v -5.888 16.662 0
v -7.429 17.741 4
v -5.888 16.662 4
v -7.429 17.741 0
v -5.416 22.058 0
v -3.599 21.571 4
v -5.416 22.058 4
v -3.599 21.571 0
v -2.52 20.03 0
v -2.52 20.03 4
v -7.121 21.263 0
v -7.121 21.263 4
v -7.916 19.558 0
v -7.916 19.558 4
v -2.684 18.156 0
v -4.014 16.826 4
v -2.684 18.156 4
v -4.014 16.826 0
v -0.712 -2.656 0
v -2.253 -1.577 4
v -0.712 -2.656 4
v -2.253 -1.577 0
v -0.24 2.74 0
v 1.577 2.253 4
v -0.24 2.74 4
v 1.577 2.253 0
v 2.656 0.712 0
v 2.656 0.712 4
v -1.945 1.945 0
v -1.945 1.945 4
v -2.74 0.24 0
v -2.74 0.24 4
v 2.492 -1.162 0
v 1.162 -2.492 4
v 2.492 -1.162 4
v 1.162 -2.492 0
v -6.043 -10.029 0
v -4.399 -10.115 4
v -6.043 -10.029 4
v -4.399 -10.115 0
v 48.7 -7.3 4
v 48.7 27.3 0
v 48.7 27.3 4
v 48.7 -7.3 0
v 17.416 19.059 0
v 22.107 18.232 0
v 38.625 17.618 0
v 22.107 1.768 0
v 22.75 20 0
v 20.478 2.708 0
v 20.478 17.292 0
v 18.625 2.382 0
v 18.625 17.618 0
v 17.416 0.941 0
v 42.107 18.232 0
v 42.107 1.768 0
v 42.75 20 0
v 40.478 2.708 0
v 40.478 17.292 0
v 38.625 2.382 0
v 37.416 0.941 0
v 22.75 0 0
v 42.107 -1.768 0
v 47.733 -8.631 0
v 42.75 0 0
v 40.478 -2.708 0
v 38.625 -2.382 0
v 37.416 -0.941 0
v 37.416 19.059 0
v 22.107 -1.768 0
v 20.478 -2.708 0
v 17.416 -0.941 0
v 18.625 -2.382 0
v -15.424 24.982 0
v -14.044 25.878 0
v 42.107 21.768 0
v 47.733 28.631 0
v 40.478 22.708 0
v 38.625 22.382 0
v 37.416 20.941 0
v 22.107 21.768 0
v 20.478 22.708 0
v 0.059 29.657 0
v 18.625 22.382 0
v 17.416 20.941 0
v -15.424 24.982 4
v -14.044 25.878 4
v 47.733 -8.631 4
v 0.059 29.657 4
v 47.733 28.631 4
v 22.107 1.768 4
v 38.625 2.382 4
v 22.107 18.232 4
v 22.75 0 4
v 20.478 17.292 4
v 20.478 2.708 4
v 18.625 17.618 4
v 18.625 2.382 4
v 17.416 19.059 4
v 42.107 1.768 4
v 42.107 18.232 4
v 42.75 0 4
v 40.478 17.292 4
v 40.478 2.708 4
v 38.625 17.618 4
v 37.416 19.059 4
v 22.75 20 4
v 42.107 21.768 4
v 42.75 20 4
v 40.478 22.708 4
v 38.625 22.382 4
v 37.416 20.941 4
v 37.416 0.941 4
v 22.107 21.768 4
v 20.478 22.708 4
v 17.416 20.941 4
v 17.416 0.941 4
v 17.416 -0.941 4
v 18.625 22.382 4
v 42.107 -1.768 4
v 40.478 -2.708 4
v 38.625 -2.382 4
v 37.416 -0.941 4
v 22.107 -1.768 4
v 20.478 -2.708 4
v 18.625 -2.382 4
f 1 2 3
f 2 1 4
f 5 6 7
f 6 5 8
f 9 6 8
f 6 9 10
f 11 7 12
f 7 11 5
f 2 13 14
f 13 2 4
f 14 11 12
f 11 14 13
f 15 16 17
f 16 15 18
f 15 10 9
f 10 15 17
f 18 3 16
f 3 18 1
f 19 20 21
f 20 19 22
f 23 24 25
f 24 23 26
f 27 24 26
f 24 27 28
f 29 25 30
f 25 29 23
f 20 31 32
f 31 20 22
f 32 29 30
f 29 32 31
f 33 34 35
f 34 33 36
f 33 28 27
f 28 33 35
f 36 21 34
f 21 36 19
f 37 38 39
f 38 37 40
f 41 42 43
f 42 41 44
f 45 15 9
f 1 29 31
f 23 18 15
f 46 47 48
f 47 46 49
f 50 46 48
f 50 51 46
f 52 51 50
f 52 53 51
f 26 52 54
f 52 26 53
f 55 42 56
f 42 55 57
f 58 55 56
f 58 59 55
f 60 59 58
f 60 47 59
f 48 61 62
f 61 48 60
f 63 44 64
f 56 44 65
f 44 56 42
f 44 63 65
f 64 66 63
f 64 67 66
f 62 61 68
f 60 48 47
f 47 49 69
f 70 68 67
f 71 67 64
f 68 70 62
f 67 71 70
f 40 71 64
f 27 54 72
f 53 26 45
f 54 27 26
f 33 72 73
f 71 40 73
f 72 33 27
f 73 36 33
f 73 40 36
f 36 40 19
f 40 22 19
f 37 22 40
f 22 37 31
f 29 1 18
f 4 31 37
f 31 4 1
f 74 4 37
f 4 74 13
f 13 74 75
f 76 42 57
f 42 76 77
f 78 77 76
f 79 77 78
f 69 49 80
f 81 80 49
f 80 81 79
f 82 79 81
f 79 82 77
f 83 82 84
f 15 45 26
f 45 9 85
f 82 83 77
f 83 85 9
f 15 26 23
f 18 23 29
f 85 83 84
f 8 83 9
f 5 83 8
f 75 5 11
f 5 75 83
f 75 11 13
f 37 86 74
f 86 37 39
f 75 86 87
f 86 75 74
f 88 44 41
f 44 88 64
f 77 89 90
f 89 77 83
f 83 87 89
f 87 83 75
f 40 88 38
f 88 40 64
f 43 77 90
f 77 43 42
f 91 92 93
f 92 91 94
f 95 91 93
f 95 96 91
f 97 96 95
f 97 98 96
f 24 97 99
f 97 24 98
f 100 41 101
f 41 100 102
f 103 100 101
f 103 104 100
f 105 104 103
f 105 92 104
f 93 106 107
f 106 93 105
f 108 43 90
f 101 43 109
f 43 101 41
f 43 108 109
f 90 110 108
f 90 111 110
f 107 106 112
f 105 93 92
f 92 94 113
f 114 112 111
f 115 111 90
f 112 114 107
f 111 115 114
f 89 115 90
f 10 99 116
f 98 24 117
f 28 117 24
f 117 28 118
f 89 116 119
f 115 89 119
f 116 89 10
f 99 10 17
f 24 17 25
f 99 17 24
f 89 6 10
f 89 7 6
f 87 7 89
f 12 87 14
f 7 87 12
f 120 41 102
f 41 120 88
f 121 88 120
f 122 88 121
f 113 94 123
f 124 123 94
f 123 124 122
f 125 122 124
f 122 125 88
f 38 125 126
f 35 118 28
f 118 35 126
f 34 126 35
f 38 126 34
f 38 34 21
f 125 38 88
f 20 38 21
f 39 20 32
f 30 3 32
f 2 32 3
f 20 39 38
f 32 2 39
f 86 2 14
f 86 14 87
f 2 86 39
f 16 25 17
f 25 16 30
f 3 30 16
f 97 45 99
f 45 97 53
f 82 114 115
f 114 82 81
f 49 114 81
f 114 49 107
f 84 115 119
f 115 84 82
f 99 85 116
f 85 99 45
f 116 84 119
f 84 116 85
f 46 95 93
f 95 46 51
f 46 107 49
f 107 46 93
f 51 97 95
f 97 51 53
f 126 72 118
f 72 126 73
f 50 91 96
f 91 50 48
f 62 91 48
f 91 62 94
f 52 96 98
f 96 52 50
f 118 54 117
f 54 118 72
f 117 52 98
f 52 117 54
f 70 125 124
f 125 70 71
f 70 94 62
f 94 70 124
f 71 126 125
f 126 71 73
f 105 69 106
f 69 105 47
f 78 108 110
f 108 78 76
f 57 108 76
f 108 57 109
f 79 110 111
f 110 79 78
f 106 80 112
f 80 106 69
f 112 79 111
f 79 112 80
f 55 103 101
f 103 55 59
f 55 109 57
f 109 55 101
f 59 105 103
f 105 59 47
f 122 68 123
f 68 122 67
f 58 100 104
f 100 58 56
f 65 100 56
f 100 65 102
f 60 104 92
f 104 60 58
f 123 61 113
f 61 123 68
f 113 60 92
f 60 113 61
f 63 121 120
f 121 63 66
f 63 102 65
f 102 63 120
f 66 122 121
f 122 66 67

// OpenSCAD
// rob@openpart.co.uk 20140202-02:02
// 6 hole joining plate to connect 40mm to 20mm NOMINAL extrusion at 15 degrees
// V-Slot & others

module roundedRect(size, radius) {
	x = size[0];
	y = size[1];
	z = size[2];
	linear_extrude(height=z)
	hull()
	{
		// place 4 circles in the corners, with the given radius
		translate([(-x/2)+(radius/2), (-y/2)+(radius/2), 0])
		circle(r=radius);
		translate([(x/2)-(radius/2), (-y/2)+(radius/2), 0])
		circle(r=radius);
		translate([(-x/2)+(radius/2), (y/2)-(radius/2), 0])
		circle(r=radius);
		translate([(x/2)-(radius/2), (y/2)-(radius/2), 0])
		circle(r=radius);
	}
}
angle = 15;
hole = 5.5 / 2;
plate_width1 = 36;
plate_width2 = 36;
plate_length = 16;
plate_thickness = 4;
extend_past_thickness = 2;
corner_radius = 1.4;
difference() {
	hull () {
		rotate([0,0,angle]) {
			translate([0, 10, 0])
				roundedRect ([plate_length, plate_width1, plate_thickness], corner_radius);
		}
		translate([40, 10, 0])
				roundedRect ([plate_length, plate_width2, plate_thickness], corner_radius);
		}
		translate([20,20,-1])
			cylinder(h = (extend_past_thickness+plate_thickness+2), r = hole);
		translate([20,0,-1])
			cylinder(h = (extend_past_thickness+plate_thickness+2), r = hole);
		translate([40,20,-1])
			cylinder(h = (extend_past_thickness+plate_thickness+2), r = hole);
		translate([40,0,-1])
			cylinder(h = (extend_past_thickness+plate_thickness+2), r = hole);
		rotate([0,0,angle]) {
			translate([0,20,-1])
				cylinder(h = (extend_past_thickness+plate_thickness+2), r = hole);
			translate([0,0,-1])
				cylinder(h = (extend_past_thickness+plate_thickness+2), r = hole);
		}
}
